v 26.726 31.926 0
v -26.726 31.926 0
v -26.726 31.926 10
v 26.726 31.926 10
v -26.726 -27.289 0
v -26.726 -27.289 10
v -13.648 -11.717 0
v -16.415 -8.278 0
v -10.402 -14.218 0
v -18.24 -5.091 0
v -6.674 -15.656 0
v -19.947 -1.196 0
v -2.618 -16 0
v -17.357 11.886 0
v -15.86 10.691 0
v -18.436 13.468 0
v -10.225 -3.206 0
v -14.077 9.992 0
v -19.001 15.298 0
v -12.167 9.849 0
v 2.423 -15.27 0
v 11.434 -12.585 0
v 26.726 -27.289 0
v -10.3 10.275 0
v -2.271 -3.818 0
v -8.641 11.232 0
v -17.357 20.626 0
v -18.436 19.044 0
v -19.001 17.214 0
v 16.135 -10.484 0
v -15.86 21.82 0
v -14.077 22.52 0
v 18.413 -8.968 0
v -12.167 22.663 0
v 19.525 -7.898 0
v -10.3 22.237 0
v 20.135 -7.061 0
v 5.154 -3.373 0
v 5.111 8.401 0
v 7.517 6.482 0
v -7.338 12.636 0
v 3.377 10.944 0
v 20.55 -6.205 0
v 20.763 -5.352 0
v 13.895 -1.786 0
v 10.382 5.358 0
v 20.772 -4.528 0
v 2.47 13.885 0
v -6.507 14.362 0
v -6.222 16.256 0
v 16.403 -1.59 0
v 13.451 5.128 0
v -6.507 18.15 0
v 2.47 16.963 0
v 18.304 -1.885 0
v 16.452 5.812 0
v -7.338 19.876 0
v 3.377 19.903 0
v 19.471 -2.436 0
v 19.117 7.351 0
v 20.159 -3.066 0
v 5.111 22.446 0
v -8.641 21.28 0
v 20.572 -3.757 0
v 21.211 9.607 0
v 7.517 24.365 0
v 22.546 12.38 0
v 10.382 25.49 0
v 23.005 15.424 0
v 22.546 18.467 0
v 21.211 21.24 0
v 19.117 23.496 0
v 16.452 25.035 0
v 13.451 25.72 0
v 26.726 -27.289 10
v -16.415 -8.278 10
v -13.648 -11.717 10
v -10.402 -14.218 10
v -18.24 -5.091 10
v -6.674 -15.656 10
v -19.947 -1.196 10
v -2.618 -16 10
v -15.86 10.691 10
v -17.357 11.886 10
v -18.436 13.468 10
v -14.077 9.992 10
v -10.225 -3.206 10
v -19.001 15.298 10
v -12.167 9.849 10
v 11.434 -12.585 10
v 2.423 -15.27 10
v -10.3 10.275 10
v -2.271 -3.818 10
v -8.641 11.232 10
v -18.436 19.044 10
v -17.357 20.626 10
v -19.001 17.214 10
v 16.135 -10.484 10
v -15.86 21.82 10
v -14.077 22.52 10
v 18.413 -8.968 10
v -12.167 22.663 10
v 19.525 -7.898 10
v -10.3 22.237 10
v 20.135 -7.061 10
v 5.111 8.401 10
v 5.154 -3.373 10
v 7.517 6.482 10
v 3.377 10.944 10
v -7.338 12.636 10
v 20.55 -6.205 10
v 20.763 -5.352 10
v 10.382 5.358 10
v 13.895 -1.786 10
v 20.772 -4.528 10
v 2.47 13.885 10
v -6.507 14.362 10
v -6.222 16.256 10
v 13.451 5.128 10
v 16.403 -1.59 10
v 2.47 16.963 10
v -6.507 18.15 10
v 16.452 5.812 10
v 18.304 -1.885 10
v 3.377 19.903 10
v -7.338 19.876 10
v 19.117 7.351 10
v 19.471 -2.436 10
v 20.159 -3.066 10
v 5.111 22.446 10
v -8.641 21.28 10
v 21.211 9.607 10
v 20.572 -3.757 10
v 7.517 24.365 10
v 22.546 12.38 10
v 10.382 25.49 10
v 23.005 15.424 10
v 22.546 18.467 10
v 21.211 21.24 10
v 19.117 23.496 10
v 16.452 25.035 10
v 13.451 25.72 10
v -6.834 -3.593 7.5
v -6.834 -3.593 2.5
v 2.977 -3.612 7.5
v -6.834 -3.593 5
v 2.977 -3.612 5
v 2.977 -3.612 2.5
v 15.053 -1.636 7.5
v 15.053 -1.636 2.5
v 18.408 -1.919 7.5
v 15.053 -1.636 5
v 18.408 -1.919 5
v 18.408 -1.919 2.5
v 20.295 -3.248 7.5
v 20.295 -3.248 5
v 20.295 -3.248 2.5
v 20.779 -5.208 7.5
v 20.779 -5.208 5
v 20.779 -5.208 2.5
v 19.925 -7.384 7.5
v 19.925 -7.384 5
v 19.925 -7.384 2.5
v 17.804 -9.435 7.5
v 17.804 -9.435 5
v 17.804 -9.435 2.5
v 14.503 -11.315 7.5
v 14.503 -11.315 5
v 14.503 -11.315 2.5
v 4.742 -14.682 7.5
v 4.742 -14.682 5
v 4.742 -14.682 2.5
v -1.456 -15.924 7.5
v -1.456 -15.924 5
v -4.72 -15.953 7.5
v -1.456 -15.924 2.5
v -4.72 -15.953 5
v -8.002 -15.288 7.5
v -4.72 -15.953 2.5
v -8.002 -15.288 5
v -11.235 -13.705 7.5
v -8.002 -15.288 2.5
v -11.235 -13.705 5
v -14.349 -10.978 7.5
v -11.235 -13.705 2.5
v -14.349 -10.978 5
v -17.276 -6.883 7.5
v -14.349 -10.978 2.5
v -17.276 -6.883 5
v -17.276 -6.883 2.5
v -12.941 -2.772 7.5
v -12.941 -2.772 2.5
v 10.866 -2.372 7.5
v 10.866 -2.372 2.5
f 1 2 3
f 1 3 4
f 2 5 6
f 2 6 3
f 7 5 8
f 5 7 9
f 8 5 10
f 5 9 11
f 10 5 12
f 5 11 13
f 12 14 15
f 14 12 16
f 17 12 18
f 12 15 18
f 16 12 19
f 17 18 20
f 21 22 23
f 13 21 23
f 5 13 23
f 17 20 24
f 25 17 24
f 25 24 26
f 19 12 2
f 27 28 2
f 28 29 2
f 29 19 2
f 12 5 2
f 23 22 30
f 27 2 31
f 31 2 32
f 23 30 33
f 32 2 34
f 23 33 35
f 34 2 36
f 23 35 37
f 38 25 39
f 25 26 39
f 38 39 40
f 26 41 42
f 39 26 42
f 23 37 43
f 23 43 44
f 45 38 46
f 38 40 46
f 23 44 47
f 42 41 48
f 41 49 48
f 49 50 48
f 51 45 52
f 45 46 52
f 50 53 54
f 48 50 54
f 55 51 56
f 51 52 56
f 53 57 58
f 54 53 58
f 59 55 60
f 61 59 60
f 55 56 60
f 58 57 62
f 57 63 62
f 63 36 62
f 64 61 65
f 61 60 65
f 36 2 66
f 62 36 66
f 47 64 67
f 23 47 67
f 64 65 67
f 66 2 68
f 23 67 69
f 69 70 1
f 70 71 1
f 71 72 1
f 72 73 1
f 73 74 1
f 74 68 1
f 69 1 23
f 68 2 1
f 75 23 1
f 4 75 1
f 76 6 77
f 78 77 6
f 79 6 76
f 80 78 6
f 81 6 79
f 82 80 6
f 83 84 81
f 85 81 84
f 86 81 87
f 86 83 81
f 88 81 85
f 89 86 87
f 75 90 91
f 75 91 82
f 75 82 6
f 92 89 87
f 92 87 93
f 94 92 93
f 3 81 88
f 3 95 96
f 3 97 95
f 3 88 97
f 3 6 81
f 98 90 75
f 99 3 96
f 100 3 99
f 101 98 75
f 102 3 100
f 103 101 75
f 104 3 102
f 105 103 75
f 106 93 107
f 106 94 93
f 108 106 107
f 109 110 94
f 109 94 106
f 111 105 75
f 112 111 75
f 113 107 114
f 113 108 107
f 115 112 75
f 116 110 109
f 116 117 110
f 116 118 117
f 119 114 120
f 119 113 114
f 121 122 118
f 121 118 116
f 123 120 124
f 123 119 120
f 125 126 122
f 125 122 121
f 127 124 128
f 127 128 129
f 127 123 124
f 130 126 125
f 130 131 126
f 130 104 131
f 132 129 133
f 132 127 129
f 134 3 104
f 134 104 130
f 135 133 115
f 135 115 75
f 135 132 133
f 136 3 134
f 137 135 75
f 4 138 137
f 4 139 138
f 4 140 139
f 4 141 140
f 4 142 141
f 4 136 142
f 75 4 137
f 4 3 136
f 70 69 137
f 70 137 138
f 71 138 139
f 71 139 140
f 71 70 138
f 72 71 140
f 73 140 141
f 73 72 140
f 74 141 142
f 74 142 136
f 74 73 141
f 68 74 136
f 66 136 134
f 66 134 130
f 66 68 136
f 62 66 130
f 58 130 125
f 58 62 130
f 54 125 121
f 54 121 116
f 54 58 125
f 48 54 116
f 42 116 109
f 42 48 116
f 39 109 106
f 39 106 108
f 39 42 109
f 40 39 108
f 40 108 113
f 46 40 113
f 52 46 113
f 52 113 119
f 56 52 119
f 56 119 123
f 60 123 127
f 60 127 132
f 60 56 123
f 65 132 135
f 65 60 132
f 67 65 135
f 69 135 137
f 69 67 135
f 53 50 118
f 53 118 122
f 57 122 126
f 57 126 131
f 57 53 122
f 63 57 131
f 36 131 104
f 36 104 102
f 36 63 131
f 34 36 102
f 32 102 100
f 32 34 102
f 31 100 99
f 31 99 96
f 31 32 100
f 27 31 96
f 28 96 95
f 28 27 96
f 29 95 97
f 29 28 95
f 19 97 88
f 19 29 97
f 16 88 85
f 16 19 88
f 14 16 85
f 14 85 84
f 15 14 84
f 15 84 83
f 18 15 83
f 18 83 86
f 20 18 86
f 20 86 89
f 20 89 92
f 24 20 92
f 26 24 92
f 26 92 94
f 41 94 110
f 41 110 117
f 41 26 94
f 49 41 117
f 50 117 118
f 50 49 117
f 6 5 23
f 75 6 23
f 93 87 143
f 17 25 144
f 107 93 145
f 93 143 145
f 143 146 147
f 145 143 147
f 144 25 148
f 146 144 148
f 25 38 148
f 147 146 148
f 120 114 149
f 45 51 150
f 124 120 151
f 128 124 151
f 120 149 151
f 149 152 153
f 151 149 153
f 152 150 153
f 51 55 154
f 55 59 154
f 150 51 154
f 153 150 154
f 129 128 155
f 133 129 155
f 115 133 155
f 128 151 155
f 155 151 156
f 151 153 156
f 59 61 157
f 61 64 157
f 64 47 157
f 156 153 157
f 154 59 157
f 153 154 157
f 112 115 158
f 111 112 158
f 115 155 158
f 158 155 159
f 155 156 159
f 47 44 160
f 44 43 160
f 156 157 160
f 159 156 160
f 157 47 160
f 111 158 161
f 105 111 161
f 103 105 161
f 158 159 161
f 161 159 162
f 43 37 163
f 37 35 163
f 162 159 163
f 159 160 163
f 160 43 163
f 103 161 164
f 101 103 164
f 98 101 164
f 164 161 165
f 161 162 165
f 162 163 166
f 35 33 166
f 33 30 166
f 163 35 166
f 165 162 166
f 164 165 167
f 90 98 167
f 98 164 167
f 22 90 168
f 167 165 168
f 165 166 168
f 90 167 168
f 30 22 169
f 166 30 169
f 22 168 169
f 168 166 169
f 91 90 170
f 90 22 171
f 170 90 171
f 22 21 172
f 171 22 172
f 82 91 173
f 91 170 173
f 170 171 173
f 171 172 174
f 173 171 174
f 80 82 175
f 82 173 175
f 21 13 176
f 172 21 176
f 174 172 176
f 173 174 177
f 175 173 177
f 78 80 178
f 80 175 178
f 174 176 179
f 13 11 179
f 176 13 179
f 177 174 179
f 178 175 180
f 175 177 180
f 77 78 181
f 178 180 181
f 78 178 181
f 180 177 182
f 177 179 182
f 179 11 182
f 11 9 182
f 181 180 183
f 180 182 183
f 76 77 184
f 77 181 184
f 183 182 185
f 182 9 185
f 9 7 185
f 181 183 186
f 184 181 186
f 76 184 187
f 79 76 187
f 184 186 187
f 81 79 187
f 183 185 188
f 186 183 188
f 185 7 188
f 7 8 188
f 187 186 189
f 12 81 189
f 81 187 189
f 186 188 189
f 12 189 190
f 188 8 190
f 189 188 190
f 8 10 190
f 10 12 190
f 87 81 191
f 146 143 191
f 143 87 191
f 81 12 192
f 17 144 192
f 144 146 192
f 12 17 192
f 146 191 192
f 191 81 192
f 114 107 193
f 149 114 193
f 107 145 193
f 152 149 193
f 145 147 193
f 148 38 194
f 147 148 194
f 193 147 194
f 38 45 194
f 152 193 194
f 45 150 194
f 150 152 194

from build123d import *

# Parameters (mm, degrees)
SKETCH_W      = 53.45282
SKETCH_H      = 59.21522
SKETCH_R      = 6.425339
SKETCH_R_2    = 10.324995
EXTRUDE_DEPTH = 10


with BuildPart() as part:
    # Sketch → Extrude (new body)
    with BuildSketch(Plane.XY):
        with Locations((0, 2.318671)):
            Rectangle(SKETCH_W, SKETCH_H)
        with BuildLine():
            add(Edge.make_bspline(
                [(-19.946921, -1.195606), (0, -6.54668), (19.142079, 2.263024), (23.318579, -7.917126), (7.134789, -14.899626), (-13.22541, -18.684495), (-19.946921, -1.195606)],
                knots=[0, 0, 0, 0, 0.25, 0.5, 0.75, 1, 1, 1, 1], degree=3))
        make_face(mode=Mode.SUBTRACT)
        with Locations((-12.647216, 16.255993)):
            Circle(SKETCH_R, mode=Mode.SUBTRACT)
        with Locations((12.679785, 15.423649)):
            Circle(SKETCH_R_2, mode=Mode.SUBTRACT)
    extrude(amount=EXTRUDE_DEPTH)


solid = part.part
